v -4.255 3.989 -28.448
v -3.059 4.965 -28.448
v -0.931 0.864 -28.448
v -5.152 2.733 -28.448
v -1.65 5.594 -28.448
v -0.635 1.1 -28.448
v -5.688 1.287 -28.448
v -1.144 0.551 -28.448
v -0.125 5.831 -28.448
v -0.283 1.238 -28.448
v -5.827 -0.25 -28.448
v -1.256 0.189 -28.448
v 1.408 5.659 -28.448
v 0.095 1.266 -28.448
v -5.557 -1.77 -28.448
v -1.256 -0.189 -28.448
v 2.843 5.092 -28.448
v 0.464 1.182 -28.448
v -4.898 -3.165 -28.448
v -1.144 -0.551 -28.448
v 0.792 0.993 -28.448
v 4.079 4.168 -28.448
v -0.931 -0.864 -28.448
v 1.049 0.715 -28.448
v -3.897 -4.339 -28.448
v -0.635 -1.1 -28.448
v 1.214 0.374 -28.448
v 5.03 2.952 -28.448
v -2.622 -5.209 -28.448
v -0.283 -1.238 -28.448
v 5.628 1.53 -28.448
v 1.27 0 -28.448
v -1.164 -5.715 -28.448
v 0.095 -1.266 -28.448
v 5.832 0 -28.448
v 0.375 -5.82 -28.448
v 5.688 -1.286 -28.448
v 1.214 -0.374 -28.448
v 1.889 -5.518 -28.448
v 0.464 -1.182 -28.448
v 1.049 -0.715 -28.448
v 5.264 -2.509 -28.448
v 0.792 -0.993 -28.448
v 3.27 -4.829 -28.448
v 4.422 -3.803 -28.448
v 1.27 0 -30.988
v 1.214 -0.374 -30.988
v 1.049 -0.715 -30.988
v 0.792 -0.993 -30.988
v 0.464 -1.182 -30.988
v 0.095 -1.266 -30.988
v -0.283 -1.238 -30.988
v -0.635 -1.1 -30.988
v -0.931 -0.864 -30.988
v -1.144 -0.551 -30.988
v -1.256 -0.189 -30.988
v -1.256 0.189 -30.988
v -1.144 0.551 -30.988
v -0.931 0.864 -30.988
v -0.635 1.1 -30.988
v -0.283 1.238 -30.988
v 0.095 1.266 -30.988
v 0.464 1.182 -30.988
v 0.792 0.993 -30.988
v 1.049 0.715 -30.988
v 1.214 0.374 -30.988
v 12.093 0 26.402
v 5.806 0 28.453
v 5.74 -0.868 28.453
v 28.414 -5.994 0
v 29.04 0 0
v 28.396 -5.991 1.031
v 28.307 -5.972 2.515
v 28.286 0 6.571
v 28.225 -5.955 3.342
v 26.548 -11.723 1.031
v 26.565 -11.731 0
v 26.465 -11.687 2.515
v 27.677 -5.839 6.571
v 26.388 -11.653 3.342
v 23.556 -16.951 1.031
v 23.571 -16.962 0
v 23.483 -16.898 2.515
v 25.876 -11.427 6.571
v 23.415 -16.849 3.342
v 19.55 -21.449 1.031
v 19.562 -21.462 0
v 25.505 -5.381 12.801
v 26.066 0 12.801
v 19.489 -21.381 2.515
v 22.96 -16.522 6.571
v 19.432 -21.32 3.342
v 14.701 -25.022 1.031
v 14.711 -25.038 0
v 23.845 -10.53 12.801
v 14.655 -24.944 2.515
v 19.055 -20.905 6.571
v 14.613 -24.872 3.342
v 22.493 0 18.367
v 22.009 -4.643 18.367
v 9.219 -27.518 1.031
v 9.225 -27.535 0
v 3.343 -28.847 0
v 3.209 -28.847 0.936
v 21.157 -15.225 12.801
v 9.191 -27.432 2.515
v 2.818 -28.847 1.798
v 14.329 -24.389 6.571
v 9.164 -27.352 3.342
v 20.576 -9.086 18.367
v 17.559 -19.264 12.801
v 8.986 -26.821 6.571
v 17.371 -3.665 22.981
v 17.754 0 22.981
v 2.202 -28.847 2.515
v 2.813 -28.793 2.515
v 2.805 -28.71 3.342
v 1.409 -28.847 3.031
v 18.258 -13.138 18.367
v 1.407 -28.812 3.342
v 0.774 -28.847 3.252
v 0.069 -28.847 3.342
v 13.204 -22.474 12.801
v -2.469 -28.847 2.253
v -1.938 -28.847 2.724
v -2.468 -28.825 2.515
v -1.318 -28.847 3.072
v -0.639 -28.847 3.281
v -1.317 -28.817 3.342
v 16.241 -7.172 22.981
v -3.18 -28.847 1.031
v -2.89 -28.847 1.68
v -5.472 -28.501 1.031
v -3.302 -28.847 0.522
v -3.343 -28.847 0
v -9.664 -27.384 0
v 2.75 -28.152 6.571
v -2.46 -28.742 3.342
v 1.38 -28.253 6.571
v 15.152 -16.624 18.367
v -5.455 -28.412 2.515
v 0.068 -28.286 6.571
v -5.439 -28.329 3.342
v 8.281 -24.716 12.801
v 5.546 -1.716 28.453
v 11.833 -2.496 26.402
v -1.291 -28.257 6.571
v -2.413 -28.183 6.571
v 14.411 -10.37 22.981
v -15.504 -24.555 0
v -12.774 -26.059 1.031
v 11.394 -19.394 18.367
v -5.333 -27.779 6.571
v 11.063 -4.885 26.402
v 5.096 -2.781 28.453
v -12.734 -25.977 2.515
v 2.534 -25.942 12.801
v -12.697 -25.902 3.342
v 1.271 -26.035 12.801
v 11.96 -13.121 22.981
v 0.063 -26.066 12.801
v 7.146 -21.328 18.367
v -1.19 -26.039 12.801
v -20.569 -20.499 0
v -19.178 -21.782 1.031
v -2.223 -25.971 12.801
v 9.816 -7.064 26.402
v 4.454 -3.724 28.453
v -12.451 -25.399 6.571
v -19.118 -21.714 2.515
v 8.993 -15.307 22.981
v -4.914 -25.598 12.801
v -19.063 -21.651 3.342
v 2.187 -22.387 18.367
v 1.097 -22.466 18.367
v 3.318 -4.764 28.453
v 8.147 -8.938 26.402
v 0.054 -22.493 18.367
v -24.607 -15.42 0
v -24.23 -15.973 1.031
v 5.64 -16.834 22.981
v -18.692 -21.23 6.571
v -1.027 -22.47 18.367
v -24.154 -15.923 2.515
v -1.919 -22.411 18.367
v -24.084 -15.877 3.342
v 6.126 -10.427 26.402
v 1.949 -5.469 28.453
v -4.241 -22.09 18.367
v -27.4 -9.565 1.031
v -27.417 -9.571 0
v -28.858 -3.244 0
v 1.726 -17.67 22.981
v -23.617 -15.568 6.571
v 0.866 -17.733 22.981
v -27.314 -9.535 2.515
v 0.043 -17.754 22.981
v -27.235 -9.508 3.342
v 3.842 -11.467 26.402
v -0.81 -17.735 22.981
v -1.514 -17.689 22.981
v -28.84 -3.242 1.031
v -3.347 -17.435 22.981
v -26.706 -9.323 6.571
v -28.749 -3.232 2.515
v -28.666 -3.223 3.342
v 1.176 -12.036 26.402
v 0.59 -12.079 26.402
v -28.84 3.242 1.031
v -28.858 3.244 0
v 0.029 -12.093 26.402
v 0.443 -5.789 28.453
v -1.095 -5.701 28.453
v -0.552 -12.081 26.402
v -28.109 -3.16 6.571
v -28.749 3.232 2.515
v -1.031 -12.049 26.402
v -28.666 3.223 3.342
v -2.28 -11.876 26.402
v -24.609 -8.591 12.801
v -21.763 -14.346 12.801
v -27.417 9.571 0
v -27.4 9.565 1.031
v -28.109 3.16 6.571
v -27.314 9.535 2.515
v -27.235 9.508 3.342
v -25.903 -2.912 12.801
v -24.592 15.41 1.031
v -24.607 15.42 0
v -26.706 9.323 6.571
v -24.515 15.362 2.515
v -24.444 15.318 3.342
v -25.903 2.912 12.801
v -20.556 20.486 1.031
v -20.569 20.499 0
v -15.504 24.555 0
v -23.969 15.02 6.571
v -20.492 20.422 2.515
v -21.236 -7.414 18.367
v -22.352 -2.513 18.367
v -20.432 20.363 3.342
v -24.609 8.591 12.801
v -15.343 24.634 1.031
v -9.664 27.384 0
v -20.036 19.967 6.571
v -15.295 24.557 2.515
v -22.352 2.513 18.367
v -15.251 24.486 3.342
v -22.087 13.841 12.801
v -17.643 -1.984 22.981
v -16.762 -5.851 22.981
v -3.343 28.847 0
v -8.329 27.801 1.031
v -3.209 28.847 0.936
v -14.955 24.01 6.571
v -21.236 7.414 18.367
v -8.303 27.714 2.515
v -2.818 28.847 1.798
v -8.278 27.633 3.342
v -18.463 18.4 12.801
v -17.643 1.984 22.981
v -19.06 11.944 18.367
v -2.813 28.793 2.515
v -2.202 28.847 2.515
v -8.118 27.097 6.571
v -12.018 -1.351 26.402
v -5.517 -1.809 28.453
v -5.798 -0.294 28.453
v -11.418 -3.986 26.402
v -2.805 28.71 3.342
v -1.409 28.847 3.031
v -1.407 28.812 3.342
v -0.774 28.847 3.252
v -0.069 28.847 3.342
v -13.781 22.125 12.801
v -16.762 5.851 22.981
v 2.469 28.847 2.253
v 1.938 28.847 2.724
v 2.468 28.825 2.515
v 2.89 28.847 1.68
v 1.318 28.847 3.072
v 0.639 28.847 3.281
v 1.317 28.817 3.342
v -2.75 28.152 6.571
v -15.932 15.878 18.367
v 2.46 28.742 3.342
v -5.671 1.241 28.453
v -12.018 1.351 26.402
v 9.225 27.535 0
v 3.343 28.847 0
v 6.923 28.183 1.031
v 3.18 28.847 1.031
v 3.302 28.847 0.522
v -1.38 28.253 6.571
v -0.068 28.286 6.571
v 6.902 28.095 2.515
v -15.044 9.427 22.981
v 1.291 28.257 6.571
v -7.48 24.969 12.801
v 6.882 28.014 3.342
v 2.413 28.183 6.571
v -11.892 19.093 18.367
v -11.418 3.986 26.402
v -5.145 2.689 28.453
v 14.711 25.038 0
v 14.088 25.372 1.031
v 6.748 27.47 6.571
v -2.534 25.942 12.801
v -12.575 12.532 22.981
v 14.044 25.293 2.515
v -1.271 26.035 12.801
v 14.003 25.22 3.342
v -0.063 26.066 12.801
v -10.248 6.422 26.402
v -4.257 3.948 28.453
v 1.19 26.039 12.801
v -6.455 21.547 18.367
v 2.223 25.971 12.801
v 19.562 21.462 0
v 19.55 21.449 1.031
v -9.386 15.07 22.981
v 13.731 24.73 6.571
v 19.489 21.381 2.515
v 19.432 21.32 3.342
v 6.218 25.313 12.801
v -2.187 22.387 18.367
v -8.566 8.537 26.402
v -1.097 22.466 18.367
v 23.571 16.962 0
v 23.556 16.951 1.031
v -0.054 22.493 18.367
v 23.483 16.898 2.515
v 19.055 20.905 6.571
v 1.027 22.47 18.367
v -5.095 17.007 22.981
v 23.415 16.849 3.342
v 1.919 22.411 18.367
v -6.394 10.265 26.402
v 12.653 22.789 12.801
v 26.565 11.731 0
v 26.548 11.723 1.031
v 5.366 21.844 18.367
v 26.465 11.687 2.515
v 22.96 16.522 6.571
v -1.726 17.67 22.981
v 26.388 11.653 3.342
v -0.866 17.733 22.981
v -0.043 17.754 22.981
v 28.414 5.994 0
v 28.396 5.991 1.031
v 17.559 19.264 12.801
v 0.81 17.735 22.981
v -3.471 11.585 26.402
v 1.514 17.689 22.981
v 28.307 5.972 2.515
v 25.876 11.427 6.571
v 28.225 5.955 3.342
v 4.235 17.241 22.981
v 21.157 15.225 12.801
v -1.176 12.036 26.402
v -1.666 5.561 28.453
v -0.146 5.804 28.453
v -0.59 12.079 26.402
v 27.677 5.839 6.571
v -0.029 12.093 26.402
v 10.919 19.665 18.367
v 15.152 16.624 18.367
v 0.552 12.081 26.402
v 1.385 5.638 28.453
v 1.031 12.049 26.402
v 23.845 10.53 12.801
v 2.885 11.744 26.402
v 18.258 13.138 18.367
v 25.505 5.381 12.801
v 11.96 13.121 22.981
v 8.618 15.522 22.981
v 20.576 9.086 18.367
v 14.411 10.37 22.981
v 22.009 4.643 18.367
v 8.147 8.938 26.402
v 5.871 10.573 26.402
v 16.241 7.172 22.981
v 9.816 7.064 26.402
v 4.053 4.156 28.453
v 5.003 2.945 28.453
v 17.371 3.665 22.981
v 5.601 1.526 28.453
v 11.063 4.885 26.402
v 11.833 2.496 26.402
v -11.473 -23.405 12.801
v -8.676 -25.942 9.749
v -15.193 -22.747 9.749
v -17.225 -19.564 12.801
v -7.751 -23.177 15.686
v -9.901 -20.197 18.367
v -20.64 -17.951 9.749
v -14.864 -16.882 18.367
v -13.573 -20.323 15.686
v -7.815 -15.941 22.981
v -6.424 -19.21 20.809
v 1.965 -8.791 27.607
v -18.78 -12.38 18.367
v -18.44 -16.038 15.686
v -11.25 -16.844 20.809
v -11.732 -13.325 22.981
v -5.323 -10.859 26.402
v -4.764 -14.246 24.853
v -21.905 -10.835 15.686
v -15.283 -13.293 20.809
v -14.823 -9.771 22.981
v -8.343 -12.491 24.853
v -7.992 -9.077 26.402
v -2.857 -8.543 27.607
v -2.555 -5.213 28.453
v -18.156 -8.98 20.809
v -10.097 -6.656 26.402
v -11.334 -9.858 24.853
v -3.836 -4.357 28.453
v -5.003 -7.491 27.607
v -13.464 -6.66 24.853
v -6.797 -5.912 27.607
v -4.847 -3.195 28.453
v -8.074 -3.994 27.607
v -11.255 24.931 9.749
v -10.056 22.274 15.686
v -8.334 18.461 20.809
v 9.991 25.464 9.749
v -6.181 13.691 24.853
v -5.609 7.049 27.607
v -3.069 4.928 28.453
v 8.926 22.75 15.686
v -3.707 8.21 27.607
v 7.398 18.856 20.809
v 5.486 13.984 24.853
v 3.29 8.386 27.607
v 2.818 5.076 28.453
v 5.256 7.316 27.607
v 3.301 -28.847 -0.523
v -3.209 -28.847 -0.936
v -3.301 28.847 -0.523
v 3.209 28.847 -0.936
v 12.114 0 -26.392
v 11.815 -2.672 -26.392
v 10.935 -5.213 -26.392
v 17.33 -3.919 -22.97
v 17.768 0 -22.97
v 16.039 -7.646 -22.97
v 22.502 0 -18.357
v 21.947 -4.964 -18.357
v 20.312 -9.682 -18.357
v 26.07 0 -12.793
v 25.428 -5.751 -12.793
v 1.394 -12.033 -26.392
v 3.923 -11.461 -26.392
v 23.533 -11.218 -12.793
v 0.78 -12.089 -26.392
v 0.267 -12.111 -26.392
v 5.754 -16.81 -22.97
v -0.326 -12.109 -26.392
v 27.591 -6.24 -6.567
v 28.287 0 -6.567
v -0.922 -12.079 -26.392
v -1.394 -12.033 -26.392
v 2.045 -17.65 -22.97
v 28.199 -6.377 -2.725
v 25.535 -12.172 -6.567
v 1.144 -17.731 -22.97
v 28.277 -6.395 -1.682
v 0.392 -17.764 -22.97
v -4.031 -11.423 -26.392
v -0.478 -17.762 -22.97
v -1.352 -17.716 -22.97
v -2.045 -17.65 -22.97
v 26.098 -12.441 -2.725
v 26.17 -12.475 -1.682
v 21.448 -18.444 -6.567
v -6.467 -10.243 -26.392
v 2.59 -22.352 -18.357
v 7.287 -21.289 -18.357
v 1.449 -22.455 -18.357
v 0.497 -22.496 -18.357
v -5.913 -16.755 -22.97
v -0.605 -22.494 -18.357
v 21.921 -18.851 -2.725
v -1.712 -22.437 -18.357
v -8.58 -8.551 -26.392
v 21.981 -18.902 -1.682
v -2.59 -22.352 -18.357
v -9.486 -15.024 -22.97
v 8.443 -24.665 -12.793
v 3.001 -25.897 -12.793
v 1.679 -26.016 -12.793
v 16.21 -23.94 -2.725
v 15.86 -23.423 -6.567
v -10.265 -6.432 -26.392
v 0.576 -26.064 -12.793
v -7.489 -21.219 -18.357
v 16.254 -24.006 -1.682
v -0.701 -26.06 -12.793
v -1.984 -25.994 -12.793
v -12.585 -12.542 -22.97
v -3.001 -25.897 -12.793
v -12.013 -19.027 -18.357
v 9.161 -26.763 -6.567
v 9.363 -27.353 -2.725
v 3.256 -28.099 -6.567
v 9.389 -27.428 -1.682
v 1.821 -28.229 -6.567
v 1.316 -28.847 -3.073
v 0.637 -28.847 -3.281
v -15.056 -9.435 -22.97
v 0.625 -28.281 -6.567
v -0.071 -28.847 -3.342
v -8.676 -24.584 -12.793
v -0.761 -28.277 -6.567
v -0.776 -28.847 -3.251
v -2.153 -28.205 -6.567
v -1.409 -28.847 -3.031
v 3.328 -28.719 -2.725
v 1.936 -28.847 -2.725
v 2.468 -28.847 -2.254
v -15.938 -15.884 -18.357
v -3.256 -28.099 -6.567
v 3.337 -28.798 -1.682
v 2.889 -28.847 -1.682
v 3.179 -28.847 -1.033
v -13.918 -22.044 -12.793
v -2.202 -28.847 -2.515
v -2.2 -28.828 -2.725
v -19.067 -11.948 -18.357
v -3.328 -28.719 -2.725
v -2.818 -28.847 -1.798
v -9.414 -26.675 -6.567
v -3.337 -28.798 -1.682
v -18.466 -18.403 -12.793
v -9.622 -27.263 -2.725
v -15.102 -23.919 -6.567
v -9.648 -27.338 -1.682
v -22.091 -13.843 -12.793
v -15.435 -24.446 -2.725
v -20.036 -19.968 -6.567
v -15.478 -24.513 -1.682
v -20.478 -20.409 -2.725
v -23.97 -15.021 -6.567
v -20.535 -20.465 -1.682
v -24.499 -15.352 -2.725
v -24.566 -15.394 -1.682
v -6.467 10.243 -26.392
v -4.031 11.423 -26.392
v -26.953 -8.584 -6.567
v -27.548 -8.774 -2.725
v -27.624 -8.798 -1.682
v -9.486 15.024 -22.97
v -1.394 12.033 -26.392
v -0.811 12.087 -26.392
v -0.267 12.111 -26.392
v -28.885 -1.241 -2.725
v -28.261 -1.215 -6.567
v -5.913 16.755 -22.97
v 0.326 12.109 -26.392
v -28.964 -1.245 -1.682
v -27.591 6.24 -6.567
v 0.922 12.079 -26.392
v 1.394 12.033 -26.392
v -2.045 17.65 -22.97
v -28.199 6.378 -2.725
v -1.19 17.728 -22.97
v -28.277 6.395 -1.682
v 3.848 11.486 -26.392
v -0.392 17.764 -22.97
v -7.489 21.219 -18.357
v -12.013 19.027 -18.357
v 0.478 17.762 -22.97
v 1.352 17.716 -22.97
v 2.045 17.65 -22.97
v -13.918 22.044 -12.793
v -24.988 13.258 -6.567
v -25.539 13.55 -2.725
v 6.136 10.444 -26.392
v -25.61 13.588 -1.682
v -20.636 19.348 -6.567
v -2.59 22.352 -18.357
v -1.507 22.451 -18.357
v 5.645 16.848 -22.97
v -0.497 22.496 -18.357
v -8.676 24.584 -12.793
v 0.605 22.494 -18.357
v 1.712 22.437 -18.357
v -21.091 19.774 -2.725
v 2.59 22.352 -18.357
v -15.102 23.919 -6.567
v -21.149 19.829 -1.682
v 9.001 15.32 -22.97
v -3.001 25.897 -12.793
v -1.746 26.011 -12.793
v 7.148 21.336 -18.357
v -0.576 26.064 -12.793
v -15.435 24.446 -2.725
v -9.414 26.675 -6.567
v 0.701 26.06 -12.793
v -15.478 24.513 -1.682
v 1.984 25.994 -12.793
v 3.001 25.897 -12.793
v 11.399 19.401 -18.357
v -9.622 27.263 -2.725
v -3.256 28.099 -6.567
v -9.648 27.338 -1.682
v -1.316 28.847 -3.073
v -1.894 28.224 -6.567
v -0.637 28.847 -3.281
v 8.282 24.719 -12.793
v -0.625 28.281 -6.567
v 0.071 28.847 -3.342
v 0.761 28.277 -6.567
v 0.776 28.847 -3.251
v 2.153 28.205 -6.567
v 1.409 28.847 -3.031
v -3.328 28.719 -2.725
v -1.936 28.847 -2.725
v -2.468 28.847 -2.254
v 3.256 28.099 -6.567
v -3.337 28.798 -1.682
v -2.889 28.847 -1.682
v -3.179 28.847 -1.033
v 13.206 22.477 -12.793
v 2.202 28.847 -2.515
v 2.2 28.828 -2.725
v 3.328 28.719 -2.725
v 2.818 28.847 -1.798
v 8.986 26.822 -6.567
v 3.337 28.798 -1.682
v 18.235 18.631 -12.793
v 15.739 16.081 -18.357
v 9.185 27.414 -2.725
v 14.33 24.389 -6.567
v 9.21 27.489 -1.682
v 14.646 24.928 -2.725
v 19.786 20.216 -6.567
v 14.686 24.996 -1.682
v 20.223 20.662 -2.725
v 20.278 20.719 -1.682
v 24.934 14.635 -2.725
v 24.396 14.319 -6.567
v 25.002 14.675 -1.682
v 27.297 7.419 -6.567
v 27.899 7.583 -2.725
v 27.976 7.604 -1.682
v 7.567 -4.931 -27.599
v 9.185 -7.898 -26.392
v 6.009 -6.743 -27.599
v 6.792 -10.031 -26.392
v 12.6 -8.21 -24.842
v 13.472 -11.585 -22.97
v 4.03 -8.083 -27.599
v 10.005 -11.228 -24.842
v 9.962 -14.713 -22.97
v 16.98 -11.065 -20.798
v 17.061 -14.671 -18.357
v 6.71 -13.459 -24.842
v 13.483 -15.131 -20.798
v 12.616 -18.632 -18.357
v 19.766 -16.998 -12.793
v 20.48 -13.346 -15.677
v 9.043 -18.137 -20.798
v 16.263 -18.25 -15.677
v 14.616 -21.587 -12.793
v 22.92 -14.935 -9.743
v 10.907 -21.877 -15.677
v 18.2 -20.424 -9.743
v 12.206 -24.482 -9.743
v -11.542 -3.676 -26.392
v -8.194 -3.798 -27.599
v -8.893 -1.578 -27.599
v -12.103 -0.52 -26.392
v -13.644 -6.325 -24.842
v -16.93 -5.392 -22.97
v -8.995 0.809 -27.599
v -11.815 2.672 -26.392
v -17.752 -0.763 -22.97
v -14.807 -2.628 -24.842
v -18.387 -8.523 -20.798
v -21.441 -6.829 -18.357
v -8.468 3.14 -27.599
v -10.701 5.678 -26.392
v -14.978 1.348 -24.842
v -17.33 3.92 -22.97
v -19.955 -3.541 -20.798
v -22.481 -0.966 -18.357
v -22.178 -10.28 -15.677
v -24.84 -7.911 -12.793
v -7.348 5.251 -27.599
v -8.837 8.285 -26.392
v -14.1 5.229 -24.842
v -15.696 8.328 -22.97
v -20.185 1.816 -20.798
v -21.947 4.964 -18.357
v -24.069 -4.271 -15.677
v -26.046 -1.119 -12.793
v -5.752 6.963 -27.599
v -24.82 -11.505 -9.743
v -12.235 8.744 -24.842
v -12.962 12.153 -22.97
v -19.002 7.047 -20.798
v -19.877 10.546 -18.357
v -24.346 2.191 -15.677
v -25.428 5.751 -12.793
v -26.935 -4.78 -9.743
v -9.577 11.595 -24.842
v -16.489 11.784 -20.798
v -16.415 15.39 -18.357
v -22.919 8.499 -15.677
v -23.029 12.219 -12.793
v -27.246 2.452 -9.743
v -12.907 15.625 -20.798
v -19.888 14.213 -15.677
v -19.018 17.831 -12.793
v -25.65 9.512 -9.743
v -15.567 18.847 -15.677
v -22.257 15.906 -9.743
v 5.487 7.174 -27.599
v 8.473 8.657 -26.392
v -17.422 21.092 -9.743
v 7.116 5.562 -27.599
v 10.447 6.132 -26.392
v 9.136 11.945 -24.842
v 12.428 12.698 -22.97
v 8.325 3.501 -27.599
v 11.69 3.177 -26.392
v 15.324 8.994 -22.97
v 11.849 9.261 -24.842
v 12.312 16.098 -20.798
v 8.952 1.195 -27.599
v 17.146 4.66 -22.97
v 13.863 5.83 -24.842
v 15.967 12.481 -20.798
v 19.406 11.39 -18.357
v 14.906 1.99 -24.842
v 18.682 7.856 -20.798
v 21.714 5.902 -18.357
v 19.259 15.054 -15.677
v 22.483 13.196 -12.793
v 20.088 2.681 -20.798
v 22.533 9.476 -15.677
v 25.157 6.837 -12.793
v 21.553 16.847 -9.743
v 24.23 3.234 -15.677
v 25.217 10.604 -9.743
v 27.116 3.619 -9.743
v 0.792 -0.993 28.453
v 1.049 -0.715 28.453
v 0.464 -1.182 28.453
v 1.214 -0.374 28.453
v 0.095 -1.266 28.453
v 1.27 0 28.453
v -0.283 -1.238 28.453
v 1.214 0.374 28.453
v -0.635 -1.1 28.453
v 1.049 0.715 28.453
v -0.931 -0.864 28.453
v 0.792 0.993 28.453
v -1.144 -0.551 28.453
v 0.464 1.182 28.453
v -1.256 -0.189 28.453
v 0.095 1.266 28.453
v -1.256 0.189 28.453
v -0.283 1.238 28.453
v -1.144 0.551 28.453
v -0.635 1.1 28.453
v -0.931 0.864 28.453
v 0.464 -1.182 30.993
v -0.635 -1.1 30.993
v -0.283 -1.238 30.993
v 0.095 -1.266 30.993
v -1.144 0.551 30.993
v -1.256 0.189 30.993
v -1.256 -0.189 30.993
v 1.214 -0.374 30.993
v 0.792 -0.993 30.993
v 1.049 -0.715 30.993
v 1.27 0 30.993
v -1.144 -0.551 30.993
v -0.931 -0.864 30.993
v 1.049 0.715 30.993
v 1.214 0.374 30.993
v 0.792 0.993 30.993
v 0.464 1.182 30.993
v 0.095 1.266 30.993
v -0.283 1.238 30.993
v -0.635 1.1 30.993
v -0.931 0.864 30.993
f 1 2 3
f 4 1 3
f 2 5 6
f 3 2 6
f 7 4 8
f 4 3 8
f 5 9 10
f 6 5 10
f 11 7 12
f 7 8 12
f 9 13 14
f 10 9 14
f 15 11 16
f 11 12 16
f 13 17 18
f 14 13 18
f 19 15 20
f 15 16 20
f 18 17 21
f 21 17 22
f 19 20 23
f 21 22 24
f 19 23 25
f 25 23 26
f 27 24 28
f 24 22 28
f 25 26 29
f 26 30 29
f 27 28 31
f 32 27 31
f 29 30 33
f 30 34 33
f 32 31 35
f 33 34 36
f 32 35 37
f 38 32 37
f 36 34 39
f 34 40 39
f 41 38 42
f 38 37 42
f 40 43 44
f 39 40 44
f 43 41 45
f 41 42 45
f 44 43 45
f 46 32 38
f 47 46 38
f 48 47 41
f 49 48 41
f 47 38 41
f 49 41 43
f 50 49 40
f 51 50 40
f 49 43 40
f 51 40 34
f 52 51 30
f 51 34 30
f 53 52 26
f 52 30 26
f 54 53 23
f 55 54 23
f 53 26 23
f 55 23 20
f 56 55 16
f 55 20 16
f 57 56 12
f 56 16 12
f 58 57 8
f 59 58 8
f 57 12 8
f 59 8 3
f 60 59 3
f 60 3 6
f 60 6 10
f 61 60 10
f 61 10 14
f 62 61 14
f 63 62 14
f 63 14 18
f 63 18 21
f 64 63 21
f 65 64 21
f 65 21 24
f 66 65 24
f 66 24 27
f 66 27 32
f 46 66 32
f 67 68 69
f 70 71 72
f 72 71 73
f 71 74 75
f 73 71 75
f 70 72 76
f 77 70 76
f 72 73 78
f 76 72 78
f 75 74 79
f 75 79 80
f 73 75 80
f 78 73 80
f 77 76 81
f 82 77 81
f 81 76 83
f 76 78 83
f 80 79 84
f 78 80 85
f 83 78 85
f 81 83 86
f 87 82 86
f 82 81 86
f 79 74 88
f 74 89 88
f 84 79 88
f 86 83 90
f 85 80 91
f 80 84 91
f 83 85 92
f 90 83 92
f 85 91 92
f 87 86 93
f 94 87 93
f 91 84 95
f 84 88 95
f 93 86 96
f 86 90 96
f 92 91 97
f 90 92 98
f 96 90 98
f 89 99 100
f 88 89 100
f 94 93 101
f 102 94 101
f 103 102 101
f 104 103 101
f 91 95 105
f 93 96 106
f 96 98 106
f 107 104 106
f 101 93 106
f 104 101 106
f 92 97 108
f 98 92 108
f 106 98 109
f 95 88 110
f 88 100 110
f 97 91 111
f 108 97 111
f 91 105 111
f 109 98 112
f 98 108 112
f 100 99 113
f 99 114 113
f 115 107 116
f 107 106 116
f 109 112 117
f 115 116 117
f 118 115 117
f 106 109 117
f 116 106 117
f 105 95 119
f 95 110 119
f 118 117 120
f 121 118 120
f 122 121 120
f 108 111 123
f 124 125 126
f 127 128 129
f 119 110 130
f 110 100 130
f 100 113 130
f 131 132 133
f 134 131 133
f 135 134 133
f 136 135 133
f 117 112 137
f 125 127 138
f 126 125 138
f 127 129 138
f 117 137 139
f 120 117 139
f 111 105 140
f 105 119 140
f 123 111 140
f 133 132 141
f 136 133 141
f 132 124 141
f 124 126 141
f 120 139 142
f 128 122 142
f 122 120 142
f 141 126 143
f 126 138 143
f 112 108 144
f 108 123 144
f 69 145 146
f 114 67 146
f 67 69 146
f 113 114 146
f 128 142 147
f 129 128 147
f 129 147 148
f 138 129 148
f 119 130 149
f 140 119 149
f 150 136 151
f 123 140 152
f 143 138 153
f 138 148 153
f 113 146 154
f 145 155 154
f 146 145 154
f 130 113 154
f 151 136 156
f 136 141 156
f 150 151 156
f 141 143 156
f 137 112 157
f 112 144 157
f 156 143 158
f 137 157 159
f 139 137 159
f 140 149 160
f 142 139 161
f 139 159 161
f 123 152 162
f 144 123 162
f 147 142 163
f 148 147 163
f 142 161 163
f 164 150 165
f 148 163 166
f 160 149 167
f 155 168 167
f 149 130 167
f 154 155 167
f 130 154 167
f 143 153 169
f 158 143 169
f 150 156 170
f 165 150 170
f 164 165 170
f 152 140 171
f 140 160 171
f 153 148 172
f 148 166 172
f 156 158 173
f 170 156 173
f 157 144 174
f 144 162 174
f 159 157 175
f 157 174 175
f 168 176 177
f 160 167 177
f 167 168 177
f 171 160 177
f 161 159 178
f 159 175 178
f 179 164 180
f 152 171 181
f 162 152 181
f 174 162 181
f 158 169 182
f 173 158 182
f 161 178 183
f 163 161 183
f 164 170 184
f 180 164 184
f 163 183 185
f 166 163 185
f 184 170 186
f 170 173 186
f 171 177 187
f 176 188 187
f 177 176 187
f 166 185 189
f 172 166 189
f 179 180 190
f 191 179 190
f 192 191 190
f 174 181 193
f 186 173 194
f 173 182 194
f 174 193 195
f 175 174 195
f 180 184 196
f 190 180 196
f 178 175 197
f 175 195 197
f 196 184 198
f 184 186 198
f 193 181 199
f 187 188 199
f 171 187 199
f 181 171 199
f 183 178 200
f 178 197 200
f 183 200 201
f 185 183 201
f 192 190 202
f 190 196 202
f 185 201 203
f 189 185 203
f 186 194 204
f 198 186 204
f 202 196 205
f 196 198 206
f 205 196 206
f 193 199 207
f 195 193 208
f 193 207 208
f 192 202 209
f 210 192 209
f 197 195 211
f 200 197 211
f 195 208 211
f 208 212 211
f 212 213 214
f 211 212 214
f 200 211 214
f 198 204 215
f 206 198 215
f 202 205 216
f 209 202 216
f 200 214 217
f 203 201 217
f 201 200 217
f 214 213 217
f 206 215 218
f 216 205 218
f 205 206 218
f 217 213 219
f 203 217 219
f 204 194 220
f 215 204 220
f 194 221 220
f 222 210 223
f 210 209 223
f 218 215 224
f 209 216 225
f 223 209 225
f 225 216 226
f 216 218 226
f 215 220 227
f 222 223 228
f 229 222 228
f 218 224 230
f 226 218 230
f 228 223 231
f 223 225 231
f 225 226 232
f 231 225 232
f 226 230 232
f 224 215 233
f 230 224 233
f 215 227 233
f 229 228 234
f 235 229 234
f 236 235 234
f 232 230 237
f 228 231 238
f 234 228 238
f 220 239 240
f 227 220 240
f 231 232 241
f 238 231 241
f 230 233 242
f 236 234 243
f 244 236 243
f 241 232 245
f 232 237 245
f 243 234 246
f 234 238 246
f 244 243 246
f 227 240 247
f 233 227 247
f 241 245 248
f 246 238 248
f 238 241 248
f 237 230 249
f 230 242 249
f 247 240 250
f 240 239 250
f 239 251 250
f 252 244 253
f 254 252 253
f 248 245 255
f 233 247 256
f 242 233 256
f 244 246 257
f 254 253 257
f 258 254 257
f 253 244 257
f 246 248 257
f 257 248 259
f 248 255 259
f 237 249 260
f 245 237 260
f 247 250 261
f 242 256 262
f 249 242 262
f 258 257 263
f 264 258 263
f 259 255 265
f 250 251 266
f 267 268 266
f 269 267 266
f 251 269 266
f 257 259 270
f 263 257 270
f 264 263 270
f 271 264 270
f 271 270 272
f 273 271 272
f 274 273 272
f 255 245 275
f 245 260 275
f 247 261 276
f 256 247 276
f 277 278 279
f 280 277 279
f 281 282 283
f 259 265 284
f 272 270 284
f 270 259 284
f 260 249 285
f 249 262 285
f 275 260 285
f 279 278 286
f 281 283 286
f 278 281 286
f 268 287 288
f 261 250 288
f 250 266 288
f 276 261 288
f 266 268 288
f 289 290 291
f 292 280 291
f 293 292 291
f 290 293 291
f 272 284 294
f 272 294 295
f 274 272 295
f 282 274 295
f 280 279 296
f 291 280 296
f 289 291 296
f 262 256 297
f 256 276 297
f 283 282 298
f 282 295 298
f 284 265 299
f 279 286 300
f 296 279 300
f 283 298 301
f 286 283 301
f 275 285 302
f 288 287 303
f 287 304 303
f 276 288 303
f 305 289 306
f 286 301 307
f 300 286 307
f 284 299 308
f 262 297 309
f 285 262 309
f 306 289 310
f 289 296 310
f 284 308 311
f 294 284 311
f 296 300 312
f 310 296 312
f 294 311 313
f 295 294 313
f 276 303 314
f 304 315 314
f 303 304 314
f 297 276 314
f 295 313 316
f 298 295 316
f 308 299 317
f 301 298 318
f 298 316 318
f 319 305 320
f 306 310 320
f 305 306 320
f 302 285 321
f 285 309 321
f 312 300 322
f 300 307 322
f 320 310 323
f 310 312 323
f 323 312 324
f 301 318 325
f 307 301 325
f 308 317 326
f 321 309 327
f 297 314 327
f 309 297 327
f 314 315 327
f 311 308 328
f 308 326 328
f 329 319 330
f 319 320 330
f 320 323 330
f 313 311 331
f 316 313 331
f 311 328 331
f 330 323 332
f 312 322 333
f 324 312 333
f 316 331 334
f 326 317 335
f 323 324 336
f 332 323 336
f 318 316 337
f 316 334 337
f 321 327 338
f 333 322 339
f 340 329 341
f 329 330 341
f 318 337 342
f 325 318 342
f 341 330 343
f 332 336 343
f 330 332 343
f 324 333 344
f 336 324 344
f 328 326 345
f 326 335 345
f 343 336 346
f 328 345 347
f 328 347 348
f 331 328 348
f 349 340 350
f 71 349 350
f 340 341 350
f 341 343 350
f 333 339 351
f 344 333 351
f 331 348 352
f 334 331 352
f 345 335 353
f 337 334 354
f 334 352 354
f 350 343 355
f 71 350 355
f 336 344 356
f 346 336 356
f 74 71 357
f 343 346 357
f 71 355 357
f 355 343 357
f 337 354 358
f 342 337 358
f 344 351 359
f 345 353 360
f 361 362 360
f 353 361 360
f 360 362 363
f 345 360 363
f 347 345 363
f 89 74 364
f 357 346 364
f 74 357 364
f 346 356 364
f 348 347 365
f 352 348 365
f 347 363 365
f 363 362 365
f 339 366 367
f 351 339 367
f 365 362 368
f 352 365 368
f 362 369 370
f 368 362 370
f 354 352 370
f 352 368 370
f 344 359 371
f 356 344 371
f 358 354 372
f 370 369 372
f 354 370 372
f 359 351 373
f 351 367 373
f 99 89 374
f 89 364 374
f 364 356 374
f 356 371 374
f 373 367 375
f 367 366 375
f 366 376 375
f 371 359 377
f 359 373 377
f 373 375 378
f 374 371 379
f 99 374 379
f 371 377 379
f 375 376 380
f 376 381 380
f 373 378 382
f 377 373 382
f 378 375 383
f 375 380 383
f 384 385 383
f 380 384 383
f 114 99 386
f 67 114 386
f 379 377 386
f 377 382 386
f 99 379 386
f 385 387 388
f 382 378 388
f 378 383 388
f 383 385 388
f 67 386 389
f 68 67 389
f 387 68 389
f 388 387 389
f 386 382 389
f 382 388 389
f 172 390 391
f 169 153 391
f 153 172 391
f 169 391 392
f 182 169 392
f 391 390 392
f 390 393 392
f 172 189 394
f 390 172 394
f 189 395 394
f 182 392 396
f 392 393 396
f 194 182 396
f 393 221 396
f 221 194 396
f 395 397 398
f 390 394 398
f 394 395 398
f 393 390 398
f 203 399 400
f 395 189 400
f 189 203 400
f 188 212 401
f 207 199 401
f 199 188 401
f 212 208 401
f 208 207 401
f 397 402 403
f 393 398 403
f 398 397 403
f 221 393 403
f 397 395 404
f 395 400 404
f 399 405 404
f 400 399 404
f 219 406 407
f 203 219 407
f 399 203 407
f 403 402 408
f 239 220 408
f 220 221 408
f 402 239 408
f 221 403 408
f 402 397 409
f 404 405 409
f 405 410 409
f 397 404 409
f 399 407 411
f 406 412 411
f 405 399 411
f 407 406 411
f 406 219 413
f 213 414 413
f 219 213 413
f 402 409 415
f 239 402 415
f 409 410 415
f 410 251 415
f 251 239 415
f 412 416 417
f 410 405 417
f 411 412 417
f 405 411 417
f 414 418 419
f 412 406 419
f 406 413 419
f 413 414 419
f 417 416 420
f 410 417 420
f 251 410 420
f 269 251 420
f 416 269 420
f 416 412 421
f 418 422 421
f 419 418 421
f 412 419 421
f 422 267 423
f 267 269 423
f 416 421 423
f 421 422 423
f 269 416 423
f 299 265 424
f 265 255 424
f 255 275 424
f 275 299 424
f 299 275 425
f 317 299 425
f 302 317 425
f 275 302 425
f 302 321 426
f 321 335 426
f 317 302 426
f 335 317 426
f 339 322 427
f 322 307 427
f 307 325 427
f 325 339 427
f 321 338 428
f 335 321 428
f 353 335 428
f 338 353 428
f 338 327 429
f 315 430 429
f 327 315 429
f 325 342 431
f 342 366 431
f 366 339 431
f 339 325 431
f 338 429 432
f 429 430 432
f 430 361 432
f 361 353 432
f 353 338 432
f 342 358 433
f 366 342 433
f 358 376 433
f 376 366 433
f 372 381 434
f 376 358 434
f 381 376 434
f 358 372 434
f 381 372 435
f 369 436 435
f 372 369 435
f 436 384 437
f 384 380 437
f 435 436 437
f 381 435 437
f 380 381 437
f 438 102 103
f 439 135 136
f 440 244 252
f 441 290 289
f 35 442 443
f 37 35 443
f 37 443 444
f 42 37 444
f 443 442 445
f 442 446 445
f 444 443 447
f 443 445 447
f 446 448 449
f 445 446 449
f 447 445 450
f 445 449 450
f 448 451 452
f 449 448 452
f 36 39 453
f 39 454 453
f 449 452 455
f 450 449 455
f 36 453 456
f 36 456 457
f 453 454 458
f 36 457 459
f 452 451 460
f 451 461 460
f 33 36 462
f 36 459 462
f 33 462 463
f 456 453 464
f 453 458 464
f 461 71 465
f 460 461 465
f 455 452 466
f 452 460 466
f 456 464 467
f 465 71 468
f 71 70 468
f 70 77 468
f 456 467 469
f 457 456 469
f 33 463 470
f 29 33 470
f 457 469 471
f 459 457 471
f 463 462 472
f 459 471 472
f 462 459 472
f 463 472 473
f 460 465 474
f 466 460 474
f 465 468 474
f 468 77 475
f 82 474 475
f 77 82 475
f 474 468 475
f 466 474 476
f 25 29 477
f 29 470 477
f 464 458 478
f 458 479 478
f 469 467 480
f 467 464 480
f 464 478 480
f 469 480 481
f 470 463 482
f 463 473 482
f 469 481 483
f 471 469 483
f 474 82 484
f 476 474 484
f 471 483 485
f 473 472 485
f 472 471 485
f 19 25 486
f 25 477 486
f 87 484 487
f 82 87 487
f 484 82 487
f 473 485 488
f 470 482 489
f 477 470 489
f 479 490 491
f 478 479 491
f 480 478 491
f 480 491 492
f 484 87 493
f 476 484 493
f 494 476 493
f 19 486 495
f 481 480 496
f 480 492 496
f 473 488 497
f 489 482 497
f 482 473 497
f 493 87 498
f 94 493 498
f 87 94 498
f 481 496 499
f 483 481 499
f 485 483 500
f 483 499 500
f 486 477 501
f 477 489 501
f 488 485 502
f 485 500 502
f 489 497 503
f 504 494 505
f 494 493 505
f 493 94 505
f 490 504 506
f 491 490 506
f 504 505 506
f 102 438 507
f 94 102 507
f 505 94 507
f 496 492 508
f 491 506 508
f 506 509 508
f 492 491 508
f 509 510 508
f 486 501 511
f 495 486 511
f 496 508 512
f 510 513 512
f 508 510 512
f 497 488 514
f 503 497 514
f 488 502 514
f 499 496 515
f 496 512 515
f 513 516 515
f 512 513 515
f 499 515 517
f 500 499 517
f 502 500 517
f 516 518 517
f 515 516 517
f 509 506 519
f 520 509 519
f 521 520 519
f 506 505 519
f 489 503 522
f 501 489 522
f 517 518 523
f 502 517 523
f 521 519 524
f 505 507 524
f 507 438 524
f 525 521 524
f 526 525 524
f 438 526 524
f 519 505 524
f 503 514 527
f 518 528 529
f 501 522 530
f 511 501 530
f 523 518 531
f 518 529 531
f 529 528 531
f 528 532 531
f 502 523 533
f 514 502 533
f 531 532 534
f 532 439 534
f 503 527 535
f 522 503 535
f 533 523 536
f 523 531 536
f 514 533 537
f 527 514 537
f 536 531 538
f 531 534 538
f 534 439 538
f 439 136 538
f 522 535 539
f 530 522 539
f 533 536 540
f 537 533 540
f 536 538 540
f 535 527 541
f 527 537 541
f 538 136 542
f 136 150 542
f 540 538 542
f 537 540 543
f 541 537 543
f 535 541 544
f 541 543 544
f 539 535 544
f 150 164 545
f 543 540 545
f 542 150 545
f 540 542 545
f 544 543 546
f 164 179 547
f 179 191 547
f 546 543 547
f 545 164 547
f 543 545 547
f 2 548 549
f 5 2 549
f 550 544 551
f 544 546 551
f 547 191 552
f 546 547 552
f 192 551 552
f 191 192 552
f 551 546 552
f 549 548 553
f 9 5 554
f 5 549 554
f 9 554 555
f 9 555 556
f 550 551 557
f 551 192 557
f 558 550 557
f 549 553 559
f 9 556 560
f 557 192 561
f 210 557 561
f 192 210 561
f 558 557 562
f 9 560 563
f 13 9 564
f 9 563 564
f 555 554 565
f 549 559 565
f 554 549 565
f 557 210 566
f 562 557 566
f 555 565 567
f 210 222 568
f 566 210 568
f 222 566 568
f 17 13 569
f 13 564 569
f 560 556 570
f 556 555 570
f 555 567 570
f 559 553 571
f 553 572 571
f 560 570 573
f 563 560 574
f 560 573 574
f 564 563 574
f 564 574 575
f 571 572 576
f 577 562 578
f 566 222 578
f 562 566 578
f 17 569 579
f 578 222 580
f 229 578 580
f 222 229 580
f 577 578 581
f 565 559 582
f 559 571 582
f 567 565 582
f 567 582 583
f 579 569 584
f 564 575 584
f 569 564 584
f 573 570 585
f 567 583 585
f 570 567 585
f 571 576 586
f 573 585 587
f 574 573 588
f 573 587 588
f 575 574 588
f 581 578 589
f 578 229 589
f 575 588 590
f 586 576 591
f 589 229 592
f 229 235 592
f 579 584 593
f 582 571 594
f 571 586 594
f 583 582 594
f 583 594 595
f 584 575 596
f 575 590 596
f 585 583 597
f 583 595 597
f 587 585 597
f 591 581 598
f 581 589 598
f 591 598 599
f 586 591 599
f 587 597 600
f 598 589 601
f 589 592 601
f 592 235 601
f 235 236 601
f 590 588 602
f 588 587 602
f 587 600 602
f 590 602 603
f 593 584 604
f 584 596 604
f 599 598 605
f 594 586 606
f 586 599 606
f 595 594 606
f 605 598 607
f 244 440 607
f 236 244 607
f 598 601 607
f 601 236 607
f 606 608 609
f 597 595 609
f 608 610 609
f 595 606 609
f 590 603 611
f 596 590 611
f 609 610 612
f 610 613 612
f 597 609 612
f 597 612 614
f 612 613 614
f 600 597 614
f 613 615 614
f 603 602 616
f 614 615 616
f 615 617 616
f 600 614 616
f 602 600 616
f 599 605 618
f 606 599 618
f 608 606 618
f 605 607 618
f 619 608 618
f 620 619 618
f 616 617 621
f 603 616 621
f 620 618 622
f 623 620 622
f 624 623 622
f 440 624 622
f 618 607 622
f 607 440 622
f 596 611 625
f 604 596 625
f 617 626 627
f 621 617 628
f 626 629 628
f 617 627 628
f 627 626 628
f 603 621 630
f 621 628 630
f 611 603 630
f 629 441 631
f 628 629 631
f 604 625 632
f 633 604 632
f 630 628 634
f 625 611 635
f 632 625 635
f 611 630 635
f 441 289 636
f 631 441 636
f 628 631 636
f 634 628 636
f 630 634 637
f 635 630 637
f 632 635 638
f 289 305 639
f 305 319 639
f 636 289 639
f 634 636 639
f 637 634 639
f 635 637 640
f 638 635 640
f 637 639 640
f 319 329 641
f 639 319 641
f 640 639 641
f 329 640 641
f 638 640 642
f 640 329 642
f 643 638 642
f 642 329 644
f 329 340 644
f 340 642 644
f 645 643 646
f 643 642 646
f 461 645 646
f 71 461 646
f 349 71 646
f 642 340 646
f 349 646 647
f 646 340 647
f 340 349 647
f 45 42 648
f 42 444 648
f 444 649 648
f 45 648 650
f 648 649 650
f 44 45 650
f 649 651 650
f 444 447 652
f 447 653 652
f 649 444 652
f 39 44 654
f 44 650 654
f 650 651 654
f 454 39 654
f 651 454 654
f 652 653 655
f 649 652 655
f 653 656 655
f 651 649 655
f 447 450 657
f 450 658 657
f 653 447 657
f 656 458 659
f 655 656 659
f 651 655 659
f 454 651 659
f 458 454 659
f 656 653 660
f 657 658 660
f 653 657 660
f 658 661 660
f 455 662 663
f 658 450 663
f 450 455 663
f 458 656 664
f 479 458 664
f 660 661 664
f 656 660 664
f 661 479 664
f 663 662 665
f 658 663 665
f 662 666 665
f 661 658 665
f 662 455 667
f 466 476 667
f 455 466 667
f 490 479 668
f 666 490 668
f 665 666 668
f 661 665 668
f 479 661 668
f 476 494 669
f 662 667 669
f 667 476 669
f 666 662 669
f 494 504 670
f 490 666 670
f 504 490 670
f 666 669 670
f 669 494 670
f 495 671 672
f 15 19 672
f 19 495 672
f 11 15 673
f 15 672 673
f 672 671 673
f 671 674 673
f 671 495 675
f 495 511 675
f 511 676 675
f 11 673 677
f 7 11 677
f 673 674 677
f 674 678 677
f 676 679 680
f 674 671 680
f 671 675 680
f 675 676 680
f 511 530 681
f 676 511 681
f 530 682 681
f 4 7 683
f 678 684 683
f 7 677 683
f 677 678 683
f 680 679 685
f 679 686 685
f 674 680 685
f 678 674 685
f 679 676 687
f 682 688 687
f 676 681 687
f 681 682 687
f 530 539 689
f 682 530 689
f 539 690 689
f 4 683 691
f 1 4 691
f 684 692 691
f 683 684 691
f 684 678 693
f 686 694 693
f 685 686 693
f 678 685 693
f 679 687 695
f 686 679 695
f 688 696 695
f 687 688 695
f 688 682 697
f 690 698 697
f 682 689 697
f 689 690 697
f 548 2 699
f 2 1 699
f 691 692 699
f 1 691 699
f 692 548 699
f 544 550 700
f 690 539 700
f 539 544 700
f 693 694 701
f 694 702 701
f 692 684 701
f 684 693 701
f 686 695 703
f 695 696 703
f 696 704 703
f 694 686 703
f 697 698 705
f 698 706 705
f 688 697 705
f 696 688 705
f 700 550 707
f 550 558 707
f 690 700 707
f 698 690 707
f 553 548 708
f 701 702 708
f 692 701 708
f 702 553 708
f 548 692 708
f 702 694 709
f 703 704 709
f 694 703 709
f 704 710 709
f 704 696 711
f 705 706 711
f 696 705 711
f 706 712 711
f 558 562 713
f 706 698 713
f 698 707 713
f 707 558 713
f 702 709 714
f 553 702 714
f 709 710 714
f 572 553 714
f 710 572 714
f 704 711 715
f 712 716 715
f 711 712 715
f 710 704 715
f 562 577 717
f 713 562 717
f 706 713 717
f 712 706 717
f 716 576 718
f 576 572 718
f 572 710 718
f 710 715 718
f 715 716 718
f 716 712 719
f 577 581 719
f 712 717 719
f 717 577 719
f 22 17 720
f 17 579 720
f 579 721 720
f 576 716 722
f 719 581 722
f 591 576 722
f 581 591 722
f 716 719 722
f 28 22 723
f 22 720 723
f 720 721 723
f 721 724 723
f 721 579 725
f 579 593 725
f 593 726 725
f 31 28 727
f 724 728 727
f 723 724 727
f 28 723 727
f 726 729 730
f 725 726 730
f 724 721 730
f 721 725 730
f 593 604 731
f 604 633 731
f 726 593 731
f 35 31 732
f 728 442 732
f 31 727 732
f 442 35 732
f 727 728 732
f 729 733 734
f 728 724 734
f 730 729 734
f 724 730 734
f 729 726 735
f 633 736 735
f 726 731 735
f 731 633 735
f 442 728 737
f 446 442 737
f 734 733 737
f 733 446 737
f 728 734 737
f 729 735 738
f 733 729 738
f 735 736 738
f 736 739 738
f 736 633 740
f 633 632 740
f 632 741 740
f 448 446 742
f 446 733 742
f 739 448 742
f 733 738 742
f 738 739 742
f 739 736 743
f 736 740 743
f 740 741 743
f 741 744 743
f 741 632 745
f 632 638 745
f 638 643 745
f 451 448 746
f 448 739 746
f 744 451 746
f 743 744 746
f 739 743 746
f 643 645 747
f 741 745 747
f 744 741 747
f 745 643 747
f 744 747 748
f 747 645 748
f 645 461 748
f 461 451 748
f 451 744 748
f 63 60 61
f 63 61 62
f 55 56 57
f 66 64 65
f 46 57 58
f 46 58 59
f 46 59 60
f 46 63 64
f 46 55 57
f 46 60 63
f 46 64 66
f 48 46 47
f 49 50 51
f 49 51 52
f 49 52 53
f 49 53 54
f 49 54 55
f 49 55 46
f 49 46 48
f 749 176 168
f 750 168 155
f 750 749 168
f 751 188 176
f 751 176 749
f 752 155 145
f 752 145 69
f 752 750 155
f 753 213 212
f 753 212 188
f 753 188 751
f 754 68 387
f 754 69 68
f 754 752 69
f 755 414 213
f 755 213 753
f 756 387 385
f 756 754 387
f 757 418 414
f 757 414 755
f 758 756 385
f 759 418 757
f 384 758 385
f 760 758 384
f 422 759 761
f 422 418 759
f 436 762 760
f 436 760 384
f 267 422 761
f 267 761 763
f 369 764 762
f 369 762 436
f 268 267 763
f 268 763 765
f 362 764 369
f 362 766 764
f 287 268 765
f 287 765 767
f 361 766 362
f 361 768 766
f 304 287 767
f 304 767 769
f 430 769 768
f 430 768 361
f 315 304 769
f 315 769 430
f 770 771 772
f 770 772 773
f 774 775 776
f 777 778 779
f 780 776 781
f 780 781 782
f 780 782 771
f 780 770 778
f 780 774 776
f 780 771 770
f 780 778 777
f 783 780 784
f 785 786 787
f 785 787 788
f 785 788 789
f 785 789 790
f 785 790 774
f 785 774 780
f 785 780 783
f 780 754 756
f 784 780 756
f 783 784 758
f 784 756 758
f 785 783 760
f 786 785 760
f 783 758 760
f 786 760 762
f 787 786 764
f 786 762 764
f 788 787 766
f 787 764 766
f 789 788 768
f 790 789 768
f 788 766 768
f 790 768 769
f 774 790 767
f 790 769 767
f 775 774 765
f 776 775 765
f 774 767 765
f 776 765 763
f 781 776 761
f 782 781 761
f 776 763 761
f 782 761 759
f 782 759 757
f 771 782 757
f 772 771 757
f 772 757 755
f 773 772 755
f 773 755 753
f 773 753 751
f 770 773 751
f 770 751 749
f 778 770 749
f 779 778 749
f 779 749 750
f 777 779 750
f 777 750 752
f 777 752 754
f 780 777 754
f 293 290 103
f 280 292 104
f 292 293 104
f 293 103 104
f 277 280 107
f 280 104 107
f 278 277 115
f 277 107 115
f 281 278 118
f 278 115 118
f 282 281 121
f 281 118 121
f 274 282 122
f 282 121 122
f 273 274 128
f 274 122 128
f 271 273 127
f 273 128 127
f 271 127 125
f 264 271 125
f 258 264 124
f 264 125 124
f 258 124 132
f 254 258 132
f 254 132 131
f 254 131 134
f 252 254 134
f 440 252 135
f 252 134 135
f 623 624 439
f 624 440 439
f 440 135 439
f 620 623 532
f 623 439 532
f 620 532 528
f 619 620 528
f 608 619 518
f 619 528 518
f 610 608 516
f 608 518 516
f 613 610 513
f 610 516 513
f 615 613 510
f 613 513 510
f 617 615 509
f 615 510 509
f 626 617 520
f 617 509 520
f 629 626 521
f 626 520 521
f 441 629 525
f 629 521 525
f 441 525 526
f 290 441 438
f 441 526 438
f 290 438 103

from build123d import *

# Parameters (mm, degrees)
F3_DEPTH  = 12.7
F4_R      = 1.27
F5_DEPTH  = 2.54
F6_R      = 1.27
F7_DEPTH  = 2.54
F5_FACE_R = 1.27
F8_DEPTH  = 5.08
F7_FACE_R = 1.27
F9_DEPTH  = 5.08
F10_R     = 3.342625
F11_DEPTH = 42.164


with BuildPart() as f1:
    # F0 (on Front) → F1 (revolve)
    with BuildSketch(Plane.XZ):
        with BuildLine():
            ThreePointArc((0, -29.039641), (20.534127, -20.534127), (29.039641, 0))
            ThreePointArc((29.039641, 0), (20.534127, 20.534127), (0, 29.039641))
            Line((0, 29.039641), (0, -29.039641))
        make_face()
    revolve(axis=Axis((0, 0, 0), (0, 0, -1)))

    # F2 (on Right) → F3 (cut, symmetric)
    with BuildSketch(Plane.YZ):
        Polygon((-32.992329, 28.453402), (0, 28.453402), (29.31824, 28.453402), (29.31824, 34.250099), (-32.992329, 34.250099), align=None)
        Polygon((29.438438, -28.448), (-32.842074, -28.448), (-32.842074, -37.691581), (29.31824, -37.691581), (29.31824, -29.660275), align=None)
    extrude(amount=F3_DEPTH, both=True, mode=Mode.SUBTRACT)

    # F4 (on face) → F5 (cut)
    with BuildSketch(Plane(origin=(0, 0, -28.448), x_dir=(1, 0, 0), z_dir=(0, 0, -1))):
        Circle(F4_R)
    extrude(amount=-F5_DEPTH, mode=Mode.SUBTRACT)

    # F6 (on face) → F7 (cut)
    with BuildSketch(Plane.XY.offset(28.453402)):
        Circle(F6_R)
    extrude(amount=-F7_DEPTH, mode=Mode.SUBTRACT)

    # F5_face (on face) → F8 (join)
    with BuildSketch(Plane(origin=(0, 0, -25.908), x_dir=(1, 0, 0), z_dir=(0, 0, -1))):
        Circle(F5_FACE_R)
    extrude(amount=F8_DEPTH)

    # F7_face (on face) → F9 (join)
    with BuildSketch(Plane.XY.offset(25.913402)):
        Circle(F7_FACE_R)
    extrude(amount=F9_DEPTH)

    # F10 (on Front) → F11 (cut, symmetric)
    with BuildSketch(Plane.XZ):
        Circle(F10_R)
    extrude(amount=F11_DEPTH, both=True, mode=Mode.SUBTRACT)


solid = f1.part
